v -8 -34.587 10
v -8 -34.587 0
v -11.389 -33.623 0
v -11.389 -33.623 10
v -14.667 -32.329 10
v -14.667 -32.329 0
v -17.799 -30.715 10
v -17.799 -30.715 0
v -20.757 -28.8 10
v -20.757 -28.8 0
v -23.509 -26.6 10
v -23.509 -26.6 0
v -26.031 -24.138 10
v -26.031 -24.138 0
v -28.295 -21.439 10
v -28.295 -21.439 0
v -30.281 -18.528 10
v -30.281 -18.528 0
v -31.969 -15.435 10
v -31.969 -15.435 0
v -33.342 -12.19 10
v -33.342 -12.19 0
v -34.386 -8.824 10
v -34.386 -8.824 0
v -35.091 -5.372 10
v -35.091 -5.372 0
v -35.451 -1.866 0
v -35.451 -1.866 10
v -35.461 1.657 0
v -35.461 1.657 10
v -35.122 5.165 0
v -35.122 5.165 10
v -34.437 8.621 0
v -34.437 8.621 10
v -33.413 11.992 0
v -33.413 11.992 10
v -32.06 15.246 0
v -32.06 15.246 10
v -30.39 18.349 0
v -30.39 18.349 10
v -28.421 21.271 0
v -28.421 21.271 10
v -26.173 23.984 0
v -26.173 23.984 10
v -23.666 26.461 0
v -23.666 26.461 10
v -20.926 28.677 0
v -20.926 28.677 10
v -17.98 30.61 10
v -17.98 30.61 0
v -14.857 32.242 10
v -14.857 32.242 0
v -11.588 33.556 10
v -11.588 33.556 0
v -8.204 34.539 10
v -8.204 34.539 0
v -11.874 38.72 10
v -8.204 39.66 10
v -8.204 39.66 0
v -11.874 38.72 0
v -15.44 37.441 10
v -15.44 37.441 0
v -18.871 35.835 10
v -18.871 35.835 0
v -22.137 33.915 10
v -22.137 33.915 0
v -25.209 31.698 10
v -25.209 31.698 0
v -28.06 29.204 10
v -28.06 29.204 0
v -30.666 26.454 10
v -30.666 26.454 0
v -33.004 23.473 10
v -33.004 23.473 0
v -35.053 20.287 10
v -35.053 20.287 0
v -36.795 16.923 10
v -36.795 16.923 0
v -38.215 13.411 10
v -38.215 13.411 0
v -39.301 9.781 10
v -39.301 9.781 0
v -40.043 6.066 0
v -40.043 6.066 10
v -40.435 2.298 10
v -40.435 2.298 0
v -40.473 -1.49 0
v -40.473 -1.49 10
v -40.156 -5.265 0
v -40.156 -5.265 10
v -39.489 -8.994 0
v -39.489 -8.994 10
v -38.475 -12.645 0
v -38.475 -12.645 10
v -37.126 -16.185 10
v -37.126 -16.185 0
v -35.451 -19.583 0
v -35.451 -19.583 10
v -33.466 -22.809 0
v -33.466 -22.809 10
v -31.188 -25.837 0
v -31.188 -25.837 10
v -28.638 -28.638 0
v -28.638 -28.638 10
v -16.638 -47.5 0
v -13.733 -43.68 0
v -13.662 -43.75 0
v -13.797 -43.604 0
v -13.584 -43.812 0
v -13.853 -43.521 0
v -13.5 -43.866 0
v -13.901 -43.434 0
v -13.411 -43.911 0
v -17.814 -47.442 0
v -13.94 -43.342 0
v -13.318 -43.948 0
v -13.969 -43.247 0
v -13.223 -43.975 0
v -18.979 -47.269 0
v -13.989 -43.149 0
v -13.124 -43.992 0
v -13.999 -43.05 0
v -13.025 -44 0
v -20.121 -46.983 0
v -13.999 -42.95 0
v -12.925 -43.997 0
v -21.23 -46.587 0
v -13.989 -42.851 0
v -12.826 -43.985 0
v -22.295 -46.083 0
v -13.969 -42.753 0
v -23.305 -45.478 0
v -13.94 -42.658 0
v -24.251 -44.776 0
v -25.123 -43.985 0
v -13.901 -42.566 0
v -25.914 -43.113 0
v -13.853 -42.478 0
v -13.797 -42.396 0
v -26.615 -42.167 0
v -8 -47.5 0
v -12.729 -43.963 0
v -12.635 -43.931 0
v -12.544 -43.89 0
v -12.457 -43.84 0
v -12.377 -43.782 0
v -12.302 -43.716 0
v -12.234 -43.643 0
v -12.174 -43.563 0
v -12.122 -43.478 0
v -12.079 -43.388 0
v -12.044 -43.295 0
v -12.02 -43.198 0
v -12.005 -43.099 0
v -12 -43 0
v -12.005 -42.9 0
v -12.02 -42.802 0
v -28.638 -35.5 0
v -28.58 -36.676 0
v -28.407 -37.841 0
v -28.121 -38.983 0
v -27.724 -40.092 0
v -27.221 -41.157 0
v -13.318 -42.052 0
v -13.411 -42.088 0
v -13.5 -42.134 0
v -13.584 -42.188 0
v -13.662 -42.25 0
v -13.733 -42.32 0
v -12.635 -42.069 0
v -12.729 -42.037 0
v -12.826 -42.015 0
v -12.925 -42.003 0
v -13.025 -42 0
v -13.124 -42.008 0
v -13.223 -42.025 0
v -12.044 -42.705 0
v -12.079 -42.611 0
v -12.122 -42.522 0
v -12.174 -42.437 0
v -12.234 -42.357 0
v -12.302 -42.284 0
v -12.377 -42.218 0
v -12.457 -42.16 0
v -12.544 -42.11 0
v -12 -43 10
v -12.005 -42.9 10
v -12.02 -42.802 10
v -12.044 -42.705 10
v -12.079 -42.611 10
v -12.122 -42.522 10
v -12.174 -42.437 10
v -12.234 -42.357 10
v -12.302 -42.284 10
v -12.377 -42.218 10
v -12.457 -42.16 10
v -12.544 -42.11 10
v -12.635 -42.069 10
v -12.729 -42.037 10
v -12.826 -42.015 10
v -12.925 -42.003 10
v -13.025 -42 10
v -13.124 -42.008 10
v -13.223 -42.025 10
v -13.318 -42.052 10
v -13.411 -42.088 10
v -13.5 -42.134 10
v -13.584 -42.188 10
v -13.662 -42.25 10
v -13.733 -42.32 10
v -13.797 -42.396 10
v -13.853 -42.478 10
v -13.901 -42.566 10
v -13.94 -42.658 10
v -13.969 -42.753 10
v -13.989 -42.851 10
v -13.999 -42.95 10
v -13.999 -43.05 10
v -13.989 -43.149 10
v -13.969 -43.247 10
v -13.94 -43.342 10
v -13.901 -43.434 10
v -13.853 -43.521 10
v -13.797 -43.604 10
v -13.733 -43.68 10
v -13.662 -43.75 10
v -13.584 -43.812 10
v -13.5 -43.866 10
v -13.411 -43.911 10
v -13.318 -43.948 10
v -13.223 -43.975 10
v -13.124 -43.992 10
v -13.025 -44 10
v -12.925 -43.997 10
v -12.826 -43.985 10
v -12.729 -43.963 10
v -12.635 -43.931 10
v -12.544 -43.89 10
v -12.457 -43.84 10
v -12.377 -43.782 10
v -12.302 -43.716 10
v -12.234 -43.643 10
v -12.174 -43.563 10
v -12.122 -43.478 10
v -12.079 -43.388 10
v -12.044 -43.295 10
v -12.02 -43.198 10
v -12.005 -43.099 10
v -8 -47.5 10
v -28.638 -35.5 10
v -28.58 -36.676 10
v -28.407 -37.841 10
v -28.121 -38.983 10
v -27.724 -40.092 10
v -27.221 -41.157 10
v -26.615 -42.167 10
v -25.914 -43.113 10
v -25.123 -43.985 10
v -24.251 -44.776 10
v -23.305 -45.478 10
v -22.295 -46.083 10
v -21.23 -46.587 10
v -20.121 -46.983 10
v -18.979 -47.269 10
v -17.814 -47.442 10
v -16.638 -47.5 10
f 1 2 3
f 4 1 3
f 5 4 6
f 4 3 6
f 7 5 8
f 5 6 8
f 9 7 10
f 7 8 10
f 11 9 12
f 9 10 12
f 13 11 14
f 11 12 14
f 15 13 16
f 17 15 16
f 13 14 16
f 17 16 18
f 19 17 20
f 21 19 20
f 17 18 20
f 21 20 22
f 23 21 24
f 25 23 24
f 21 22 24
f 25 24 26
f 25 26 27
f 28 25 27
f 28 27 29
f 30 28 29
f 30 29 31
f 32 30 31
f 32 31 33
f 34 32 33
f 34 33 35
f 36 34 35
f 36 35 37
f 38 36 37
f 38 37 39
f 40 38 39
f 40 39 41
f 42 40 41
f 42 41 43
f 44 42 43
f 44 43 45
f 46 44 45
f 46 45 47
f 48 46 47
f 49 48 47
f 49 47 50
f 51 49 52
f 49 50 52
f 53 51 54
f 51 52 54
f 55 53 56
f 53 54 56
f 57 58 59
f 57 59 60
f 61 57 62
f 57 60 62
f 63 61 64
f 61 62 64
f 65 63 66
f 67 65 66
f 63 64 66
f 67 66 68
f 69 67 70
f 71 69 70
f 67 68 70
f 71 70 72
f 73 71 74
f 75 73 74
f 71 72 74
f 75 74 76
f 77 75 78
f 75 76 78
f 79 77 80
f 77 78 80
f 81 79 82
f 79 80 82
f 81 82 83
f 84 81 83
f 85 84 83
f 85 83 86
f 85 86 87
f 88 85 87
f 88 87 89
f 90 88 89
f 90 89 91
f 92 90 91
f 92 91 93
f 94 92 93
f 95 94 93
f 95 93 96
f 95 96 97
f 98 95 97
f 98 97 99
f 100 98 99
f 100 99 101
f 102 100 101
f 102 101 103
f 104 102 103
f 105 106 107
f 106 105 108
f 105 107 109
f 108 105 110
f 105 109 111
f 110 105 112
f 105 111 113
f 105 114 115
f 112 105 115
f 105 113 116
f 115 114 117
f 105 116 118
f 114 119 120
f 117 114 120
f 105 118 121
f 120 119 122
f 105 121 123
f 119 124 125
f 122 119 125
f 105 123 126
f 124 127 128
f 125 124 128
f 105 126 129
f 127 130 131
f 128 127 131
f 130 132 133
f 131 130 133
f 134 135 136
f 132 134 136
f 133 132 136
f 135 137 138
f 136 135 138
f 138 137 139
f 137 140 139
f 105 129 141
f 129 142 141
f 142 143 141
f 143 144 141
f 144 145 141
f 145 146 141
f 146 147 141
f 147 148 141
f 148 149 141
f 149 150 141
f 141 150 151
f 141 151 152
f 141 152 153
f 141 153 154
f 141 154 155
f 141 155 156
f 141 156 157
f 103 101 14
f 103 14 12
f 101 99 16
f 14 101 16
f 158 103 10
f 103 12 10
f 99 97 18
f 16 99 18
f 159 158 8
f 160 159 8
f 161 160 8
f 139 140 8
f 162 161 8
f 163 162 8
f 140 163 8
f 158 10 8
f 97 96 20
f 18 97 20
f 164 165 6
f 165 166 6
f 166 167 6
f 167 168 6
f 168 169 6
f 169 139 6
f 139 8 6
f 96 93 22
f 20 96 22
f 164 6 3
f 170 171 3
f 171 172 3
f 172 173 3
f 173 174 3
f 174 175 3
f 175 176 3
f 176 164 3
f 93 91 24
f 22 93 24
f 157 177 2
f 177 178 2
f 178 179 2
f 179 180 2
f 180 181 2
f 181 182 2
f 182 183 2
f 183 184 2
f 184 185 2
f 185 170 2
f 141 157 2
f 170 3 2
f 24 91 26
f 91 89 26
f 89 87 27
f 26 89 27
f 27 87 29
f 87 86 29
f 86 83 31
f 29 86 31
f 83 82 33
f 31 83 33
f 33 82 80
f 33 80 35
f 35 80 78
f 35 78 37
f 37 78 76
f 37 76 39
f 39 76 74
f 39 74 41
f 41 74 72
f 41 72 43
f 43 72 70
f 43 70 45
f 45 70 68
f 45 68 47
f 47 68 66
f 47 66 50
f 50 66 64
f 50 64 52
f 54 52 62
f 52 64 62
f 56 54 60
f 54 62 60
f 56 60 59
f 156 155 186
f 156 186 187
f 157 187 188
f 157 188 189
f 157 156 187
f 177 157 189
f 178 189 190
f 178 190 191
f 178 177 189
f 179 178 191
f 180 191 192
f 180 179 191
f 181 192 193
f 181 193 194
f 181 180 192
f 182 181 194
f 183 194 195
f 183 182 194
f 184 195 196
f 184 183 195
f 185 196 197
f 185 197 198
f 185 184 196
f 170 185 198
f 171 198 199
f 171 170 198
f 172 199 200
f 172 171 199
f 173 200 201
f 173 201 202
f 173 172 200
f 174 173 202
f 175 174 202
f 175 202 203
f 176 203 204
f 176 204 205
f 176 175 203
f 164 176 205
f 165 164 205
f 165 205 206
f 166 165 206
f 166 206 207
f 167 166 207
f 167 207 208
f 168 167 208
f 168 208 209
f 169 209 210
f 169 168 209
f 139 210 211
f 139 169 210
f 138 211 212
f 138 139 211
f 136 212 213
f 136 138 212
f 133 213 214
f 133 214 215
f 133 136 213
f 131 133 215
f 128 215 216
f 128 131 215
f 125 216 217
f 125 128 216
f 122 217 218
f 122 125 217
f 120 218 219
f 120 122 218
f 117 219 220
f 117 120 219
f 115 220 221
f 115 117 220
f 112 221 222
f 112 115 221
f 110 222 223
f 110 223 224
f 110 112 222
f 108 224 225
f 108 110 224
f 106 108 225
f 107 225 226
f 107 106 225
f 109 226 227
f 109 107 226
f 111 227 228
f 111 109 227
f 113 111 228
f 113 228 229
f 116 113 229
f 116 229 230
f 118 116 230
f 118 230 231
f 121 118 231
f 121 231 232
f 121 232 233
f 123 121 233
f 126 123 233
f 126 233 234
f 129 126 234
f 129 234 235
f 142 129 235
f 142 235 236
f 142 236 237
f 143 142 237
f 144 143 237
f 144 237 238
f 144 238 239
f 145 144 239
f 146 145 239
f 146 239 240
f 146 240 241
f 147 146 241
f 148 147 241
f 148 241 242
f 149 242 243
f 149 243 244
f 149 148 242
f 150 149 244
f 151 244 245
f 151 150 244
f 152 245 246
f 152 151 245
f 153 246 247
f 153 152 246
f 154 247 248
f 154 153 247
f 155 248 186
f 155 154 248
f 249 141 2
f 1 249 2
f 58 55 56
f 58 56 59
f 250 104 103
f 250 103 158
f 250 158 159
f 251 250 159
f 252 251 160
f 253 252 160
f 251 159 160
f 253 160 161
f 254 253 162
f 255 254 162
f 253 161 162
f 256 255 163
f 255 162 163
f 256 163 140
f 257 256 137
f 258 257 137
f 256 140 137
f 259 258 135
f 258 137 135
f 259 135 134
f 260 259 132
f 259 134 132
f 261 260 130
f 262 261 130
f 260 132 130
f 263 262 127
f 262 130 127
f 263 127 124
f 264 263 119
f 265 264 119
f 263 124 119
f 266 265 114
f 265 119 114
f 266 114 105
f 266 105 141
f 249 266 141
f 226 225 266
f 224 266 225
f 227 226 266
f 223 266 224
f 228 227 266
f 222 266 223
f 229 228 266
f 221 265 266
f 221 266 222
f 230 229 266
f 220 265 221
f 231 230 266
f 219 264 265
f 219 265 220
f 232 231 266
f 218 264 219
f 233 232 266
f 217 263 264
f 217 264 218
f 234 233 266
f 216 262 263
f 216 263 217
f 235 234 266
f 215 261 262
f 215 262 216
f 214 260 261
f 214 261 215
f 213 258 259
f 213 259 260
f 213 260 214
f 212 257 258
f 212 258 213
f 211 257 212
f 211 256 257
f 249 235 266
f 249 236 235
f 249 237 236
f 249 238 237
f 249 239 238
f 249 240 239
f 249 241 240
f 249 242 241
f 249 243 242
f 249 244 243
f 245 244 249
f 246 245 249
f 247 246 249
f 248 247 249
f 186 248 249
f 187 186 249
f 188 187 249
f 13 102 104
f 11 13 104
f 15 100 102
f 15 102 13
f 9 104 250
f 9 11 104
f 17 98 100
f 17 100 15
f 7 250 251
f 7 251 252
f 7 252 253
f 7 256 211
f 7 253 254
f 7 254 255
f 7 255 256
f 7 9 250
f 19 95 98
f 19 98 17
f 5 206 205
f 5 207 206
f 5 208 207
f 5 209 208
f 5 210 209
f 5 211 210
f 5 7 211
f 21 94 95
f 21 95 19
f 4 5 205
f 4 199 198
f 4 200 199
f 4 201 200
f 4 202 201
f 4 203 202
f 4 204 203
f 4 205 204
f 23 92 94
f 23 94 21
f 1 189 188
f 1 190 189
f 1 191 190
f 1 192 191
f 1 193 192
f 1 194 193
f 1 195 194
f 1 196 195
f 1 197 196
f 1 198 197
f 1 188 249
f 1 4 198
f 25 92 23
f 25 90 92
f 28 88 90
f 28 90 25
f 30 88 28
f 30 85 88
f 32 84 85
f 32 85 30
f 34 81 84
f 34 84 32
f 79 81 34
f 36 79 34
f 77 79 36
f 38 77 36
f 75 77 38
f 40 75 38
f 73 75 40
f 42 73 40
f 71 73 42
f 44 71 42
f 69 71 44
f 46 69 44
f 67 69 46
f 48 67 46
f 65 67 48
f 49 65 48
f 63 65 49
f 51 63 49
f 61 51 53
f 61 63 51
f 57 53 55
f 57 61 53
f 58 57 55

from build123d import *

# Parameters (mm, degrees)
SKETCH1_R           = 1
BOSS_EXTRUDE1_DEPTH = 10
SKETCH2_W           = 8.204002356
SKETCH2_H           = 9.353246275
CUT_EXTRUDE1_DEPTH  = 10


with BuildPart() as part:
    # Sketch1 → Boss-Extrude1 (new body)
    with BuildSketch(Plane.XY):
        with BuildLine():
            ThreePointArc((-8, -34.586847211), (-35.270973023, 4.025973423), (0, 35.5))
            Line((0, 35.5), (0, 40.5))
            ThreePointArc((0, 40.5), (-37.417121067, 15.498679011), (-28.637824638, -28.637824638))
            Line((-28.637824638, -28.637824638), (-28.637824638, -35.5))
            ThreePointArc((-28.637824638, -35.5), (-25.123106012, -43.985281374), (-16.637824638, -47.5))
            Line((-16.637824638, -47.5), (-8, -47.5))
            Line((-8, -47.5), (-8, -34.586847211))
        make_face()
        with Locations((-13, -42.999876828)):
            Circle(SKETCH1_R, mode=Mode.SUBTRACT)
    extrude(amount=BOSS_EXTRUDE1_DEPTH)

    # Sketch2 → Cut-Extrude1 (cut)
    with BuildSketch(Plane.XY.offset(10)):
        with Locations((-4.102001178, 35.823376862)):
            Rectangle(SKETCH2_W, SKETCH2_H)
    extrude(amount=-CUT_EXTRUDE1_DEPTH, mode=Mode.SUBTRACT)


solid = part.part
